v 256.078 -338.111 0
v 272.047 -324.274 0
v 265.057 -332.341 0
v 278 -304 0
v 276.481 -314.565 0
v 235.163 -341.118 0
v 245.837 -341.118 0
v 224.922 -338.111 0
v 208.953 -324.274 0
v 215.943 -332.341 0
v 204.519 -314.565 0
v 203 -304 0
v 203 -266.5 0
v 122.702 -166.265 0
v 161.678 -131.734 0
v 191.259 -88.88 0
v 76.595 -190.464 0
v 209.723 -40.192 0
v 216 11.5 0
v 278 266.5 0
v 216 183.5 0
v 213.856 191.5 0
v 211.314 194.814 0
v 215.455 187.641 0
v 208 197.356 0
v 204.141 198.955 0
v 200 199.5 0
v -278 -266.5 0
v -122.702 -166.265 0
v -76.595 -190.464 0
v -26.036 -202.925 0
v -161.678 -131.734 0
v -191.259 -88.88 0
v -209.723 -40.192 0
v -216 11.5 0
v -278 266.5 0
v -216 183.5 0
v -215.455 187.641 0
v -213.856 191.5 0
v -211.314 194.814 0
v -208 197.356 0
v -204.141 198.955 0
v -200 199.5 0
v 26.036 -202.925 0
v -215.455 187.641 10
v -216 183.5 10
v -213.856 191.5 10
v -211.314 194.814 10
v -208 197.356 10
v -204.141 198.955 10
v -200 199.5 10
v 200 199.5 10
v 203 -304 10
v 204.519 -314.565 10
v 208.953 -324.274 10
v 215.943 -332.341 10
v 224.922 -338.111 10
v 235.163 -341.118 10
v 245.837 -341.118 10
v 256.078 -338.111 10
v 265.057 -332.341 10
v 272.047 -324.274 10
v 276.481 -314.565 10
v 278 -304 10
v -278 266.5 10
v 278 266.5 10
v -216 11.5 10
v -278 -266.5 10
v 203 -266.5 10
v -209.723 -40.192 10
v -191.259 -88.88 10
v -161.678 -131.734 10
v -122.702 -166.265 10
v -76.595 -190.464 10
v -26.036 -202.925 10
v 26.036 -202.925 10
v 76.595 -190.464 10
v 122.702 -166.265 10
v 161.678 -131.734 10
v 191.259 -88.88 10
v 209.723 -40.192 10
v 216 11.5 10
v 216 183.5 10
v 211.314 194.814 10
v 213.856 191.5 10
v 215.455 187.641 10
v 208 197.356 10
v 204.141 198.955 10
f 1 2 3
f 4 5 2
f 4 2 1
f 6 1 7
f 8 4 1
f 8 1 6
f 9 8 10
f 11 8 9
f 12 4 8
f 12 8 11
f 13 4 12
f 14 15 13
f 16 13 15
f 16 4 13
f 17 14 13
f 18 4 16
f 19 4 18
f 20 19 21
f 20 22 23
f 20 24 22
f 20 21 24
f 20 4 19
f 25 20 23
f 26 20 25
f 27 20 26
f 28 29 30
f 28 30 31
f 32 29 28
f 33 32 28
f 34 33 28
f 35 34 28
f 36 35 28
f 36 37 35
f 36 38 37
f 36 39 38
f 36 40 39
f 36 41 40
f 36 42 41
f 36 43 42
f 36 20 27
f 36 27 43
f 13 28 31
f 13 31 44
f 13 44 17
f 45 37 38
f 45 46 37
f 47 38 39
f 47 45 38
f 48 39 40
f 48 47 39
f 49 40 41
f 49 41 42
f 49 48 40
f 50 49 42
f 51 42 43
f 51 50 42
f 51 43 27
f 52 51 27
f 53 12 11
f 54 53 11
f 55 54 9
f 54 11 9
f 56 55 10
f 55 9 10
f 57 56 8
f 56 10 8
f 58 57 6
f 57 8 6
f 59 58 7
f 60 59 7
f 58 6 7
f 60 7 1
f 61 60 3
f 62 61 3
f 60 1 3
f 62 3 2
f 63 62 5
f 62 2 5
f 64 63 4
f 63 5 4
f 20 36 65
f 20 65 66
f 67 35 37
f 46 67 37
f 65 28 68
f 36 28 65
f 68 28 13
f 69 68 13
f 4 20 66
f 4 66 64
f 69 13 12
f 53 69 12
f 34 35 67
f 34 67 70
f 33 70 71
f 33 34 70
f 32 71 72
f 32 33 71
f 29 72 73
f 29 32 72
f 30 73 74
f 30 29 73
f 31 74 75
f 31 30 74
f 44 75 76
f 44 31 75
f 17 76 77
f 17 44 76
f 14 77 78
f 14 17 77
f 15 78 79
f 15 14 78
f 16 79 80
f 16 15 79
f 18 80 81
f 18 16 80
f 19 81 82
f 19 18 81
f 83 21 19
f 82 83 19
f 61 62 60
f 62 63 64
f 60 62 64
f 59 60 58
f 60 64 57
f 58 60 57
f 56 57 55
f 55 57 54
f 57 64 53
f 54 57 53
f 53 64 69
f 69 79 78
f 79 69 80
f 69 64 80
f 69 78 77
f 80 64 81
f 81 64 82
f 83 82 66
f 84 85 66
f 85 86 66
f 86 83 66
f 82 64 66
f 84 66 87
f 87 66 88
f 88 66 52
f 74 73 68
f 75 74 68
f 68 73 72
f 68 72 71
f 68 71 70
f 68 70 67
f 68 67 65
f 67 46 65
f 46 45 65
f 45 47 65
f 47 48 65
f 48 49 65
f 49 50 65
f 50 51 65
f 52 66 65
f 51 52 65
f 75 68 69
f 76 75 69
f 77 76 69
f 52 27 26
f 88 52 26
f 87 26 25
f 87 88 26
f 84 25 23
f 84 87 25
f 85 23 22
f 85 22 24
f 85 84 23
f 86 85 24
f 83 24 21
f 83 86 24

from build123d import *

# Parameters (mm, degrees)
PAD_DEPTH = 10
FILLET_R  = 16


with BuildPart() as part:
    # Sketch → Pad (new body)
    with BuildSketch(Plane.XY):
        with BuildLine():
            Line((-278, -266.5), (-278, 266.5))
            Line((-278, 266.5), (278, 266.5))
            Line((278, 266.5), (278, -304))
            ThreePointArc((203, -304), (240.5, -341.5), (278, -304))
            Line((203, -266.5), (203, -304))
            Line((-278, -266.5), (203, -266.5))
        make_face()
        with BuildLine():
            Line((-216, 11.5), (-216, 199.5))
            Line((-216, 199.5), (216, 199.5))
            Line((216, 199.5), (216, 11.5))
            ThreePointArc((-216, 11.5), (0, -204.5), (216, 11.5))
        make_face(mode=Mode.SUBTRACT)
    extrude(amount=PAD_DEPTH)

    # Fillet
    fillet_edges = [part.edges().sort_by_distance(p)[0] for p in [
        (-216, 199.5, 5),
        (216, 199.5, 5),
    ]]
    fillet(fillet_edges, radius=FILLET_R)


solid = part.part
